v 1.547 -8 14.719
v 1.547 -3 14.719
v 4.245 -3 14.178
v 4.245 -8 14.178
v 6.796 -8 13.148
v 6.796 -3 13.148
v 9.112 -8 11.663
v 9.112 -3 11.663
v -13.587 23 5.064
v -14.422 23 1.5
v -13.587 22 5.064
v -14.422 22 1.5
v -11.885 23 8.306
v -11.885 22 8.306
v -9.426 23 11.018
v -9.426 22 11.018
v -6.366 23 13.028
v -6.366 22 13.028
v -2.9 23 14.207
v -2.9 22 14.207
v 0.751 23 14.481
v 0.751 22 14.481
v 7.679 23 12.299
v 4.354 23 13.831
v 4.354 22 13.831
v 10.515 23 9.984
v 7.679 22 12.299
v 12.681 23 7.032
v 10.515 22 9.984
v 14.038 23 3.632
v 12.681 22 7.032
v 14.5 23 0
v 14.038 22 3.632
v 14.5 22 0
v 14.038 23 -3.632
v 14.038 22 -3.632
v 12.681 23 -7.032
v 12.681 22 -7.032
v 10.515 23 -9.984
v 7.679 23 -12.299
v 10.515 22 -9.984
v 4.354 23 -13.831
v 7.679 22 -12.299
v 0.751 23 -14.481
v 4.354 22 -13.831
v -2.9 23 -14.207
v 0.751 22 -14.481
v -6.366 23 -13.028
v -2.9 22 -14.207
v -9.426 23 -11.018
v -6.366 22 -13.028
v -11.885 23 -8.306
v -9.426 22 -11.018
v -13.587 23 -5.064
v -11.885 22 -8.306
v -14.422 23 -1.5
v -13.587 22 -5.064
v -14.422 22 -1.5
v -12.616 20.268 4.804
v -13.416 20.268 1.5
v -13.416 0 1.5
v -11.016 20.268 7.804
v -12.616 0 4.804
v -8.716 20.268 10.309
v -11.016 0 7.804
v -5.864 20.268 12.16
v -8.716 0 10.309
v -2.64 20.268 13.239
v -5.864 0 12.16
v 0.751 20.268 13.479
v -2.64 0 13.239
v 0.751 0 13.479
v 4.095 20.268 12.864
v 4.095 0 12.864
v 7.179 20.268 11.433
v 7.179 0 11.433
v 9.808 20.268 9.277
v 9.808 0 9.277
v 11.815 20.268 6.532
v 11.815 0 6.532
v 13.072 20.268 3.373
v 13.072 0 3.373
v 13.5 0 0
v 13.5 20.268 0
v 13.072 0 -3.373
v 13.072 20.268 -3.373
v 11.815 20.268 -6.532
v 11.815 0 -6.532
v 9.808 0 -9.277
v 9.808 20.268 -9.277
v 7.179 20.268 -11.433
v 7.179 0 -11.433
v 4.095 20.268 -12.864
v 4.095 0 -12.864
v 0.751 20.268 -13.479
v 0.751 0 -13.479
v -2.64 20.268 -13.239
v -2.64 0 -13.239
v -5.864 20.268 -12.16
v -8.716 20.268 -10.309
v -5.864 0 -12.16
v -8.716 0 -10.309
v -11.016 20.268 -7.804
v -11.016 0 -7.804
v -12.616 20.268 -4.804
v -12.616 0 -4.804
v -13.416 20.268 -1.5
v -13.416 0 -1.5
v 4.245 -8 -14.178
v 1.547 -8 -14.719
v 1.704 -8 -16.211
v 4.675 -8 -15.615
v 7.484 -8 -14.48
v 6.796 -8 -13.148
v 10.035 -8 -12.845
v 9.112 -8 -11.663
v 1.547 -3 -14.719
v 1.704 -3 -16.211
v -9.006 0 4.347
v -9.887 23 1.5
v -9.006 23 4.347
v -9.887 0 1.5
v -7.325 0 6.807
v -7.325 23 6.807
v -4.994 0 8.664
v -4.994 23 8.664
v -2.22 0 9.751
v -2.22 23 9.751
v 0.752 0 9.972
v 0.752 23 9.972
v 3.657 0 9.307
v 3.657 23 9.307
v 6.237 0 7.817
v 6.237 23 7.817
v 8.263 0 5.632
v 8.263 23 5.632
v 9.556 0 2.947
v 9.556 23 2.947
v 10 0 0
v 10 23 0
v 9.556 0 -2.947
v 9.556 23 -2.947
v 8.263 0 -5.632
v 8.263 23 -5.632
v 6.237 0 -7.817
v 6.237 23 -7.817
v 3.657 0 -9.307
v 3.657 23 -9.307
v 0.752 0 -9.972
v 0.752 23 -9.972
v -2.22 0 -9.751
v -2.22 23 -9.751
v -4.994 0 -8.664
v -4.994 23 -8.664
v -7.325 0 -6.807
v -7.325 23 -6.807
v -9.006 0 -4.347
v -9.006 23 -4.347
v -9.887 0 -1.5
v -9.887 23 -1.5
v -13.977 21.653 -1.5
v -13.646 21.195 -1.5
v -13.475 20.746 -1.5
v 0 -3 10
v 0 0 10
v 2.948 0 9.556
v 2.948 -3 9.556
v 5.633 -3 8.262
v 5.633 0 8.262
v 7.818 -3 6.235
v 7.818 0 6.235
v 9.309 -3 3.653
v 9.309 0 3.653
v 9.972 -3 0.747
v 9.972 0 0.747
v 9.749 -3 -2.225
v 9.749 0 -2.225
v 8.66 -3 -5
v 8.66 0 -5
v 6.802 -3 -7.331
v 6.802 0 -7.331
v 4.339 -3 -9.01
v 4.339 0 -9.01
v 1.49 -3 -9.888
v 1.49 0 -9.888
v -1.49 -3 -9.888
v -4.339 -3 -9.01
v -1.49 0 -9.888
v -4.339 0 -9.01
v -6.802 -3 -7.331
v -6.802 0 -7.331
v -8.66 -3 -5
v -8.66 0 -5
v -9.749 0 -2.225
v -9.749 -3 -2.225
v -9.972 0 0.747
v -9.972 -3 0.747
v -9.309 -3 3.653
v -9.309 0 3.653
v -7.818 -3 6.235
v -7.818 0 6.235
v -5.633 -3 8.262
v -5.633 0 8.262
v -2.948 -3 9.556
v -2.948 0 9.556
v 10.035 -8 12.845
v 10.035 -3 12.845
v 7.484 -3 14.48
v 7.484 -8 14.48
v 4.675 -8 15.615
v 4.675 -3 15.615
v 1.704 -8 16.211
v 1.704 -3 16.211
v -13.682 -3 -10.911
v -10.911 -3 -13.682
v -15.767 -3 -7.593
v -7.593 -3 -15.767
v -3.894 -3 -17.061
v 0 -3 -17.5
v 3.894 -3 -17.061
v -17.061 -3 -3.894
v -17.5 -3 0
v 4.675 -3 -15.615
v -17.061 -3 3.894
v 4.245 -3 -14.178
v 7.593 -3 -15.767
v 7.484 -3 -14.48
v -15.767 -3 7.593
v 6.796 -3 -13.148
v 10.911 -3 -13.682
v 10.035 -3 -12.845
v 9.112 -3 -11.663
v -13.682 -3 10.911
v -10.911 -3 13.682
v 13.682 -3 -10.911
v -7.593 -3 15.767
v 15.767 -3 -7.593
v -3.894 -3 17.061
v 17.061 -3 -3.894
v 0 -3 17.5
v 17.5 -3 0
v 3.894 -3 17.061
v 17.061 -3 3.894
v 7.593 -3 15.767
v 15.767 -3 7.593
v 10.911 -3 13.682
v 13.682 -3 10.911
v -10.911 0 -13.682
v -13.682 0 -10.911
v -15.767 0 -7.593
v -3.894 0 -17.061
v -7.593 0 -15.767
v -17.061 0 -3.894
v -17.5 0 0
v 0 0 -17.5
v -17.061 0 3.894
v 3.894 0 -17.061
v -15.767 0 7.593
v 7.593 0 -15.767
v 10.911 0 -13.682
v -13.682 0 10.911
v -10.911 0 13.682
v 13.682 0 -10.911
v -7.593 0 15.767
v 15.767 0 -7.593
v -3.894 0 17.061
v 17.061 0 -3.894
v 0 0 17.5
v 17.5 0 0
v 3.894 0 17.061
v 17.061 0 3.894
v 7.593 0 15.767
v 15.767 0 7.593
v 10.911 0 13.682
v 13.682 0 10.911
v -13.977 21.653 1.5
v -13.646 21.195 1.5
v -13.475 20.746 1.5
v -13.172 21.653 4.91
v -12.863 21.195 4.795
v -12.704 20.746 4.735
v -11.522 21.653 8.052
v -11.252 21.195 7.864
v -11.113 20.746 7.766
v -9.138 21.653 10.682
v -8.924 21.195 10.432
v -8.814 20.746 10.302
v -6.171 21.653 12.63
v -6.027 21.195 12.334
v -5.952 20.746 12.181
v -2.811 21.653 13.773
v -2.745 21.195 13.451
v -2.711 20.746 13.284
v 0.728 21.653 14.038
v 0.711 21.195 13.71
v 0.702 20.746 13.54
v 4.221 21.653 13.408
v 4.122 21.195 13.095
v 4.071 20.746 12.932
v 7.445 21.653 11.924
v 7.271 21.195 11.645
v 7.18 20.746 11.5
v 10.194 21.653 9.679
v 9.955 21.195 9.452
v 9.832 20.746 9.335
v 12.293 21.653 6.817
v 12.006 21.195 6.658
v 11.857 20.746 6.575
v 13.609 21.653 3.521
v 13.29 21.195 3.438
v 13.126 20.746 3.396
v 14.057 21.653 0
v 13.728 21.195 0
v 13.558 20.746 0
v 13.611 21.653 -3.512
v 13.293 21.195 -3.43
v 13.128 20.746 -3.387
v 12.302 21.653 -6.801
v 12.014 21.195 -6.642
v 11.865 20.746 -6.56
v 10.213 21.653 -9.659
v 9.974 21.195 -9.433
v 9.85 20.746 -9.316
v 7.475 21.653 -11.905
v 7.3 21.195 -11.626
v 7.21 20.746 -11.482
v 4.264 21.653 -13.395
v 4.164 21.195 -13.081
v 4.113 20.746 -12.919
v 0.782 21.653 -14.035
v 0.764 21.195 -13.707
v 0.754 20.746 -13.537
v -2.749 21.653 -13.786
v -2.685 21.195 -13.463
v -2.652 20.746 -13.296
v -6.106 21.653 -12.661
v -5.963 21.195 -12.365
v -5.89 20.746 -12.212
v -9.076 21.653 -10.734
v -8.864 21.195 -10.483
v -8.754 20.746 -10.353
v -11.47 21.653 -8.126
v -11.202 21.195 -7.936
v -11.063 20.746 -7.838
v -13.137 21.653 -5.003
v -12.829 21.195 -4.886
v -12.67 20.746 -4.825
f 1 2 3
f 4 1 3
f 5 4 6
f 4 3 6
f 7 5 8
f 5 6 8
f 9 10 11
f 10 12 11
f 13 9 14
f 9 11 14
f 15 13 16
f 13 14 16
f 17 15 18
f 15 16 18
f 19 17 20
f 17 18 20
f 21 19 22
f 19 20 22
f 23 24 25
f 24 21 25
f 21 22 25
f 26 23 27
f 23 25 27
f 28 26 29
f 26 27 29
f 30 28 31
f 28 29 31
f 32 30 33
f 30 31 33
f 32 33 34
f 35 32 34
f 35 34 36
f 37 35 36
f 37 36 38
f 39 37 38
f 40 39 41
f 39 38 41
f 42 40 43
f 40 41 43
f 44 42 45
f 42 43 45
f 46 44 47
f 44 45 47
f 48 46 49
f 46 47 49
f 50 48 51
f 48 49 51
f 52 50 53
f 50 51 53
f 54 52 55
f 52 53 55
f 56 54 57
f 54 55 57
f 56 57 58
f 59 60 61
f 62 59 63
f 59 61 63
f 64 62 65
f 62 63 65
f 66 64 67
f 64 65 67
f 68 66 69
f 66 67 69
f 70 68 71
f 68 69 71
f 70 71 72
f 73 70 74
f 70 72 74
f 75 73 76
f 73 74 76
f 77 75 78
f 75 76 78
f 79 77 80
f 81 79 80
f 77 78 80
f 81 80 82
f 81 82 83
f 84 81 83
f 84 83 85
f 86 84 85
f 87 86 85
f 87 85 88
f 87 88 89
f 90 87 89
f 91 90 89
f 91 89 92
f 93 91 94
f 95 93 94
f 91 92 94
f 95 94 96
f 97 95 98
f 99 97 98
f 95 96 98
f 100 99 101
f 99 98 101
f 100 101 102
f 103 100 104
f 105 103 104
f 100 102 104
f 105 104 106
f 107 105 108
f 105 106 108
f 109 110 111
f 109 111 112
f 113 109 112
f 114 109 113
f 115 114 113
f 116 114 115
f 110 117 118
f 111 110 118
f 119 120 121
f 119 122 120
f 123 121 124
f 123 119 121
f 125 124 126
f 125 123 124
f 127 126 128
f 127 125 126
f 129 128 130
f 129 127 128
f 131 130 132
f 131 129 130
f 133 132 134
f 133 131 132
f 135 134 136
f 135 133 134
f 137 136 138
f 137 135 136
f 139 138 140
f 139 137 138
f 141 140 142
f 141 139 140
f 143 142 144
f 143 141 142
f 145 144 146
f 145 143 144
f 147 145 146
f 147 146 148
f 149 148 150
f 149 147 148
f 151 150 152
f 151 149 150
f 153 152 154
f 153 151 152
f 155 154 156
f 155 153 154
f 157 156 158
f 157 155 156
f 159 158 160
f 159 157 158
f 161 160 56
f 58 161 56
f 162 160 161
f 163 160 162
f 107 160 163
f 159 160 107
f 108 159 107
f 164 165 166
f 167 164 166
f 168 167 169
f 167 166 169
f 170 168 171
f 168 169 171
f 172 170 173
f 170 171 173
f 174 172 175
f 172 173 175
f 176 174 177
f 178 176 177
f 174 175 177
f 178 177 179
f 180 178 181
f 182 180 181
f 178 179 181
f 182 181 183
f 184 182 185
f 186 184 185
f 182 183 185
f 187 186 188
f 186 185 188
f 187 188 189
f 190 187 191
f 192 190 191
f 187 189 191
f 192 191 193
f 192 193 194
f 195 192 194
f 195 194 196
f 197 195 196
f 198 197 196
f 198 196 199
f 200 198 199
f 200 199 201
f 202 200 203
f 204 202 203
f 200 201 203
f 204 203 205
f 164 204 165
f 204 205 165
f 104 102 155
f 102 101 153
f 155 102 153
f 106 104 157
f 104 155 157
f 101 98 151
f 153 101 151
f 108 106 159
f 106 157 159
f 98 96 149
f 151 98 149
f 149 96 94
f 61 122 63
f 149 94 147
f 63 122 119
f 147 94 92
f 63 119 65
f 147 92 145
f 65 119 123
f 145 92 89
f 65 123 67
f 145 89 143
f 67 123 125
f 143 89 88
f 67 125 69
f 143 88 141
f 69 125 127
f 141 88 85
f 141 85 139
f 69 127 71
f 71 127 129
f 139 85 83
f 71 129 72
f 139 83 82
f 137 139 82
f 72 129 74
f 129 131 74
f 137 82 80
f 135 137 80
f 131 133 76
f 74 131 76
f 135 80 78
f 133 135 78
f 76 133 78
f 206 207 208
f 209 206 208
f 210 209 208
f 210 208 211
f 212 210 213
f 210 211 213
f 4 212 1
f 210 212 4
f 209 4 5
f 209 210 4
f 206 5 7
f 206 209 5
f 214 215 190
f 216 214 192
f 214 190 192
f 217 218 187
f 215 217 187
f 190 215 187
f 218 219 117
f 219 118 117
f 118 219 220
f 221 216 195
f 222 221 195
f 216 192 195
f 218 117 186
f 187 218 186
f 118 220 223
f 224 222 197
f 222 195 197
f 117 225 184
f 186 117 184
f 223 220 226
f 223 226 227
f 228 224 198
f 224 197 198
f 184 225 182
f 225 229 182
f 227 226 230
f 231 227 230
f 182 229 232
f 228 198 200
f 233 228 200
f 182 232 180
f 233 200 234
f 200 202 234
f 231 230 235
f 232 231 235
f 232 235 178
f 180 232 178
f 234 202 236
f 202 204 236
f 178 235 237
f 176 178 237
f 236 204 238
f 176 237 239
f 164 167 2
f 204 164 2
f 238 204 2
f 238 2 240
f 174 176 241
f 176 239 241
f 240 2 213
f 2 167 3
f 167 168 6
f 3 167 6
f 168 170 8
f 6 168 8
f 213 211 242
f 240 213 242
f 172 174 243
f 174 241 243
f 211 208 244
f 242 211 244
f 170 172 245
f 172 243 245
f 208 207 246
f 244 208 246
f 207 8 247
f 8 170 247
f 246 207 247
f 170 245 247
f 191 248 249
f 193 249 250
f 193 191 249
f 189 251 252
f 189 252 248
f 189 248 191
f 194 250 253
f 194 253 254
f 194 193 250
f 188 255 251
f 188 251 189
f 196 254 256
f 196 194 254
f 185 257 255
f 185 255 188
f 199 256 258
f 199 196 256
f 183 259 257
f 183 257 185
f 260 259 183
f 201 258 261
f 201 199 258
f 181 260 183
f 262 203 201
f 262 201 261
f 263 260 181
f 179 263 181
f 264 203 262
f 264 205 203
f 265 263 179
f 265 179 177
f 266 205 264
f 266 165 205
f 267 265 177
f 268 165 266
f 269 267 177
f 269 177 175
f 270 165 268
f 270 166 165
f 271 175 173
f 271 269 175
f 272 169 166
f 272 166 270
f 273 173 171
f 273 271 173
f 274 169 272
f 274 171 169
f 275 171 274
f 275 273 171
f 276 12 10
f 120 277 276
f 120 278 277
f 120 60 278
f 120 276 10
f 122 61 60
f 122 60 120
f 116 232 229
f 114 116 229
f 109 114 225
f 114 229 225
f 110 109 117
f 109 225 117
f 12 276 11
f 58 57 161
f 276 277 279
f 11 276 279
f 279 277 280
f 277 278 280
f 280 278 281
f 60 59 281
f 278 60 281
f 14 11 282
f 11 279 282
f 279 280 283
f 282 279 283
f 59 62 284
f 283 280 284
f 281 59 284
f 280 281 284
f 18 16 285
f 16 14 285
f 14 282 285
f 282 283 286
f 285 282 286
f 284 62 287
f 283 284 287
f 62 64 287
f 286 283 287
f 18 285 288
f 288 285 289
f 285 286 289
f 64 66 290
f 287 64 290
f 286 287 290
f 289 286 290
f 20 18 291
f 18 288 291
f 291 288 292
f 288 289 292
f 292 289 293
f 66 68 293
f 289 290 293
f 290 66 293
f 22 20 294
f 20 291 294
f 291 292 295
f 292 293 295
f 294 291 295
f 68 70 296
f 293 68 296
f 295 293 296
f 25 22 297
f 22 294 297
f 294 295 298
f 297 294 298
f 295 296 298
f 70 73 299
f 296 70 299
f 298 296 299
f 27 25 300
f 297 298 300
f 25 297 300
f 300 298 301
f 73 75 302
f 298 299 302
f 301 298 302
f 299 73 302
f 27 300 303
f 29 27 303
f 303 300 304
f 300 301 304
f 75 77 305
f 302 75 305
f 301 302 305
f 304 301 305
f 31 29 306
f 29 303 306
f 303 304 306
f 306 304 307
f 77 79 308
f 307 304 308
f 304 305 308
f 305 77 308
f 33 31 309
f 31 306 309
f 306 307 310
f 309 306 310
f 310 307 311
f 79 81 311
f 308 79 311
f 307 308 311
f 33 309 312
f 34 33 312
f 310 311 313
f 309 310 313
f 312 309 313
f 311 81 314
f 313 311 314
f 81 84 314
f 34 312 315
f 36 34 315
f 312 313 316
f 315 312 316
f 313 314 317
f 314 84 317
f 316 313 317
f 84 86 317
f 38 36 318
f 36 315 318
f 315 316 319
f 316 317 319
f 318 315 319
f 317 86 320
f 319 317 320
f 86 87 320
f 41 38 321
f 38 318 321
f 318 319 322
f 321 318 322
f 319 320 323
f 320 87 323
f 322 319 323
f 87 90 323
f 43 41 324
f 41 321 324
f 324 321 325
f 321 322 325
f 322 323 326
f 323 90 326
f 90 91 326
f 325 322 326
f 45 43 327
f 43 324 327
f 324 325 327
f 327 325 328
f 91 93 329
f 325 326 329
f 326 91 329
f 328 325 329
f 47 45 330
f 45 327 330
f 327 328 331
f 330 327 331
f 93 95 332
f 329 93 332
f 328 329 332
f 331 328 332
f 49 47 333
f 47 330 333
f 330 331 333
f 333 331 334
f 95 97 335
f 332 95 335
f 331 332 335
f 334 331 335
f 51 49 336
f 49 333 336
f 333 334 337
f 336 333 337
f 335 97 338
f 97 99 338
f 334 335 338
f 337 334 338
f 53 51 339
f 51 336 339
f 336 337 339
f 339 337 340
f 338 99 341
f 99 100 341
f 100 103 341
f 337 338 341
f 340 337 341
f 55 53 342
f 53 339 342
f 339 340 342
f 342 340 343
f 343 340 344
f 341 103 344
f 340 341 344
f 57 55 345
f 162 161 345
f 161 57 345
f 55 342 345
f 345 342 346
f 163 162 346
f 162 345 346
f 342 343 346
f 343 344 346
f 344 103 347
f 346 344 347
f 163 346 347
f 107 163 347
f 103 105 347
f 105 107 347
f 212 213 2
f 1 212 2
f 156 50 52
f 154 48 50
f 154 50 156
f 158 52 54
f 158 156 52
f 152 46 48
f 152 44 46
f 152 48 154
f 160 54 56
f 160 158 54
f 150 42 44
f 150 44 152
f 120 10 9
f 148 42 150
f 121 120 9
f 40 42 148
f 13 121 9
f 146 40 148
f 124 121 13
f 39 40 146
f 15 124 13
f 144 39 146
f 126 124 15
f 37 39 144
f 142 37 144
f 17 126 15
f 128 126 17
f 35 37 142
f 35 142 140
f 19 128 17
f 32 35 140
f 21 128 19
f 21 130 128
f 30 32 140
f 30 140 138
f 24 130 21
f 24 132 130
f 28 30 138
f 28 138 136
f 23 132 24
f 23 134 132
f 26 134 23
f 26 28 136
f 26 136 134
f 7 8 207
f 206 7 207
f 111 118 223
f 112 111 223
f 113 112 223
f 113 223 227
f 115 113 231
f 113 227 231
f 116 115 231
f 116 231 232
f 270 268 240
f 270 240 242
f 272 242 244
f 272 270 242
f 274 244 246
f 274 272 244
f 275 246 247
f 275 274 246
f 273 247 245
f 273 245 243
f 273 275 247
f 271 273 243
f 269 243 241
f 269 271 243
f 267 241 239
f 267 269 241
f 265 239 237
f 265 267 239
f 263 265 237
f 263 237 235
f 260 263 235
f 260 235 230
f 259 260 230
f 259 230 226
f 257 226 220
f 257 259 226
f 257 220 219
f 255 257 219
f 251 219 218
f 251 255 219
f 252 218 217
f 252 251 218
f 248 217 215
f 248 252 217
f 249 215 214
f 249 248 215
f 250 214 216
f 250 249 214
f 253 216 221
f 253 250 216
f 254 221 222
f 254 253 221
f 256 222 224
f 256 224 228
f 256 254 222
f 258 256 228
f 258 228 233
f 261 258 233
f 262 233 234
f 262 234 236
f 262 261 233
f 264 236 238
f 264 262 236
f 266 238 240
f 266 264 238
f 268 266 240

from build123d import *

# Parameters (mm, degrees)
SKETCH2_R           = 13.5
SKETCH2_R_2         = 10
BOSS_EXTRUDE1_DEPTH = 22
SKETCH2_4_R         = 17.5
SKETCH2_4_R_2       = 13.5
SKETCH2_4_R_3       = 10
BOSS_EXTRUDE2_DEPTH = 3
BOSS_EXTRUDE3_DEPTH = 5
SKETCH4_R           = 14.5
SKETCH4_R_2         = 10
BOSS_EXTRUDE4_DEPTH = 1
FILLET1_R           = 2
CUT_EXTRUDE1_START  = -31
CUT_EXTRUDE1_DEPTH  = 31


with BuildPart() as part:
    # Sketch2 → Boss-Extrude1 (new body)
    with BuildSketch(Plane(origin=(0, 0, 0), x_dir=(1, 0, 0), z_dir=(0, 1, 0))):
        with Locations(Location((0, 0, 0), (0, 0, 270))):
            Circle(SKETCH2_R)
        with Locations(Location((0, 0, 0), (0, 0, 270))):
            Circle(SKETCH2_R_2, mode=Mode.SUBTRACT)
    extrude(amount=BOSS_EXTRUDE1_DEPTH)

    # Sketch4 → Boss-Extrude4 (add)
    with BuildSketch(Plane(origin=(0, 22, 0), x_dir=(1, 0, 0), z_dir=(0, 1, 0))):
        with Locations(Location((0, 0, 0), (0, 0, 270))):
            Circle(SKETCH4_R)
        with Locations(Location((0, 0, 0), (0, 0, 270))):
            Circle(SKETCH4_R_2, mode=Mode.SUBTRACT)
    extrude(amount=BOSS_EXTRUDE4_DEPTH)

    # Fillet1
    # the kernel refuses this fillet: 2 mm, written as the material it adds along each edge
    with BuildSketch(Plane(origin=(0, 22, 0), x_dir=(0, 0, 1), z_dir=(-1, 0, 0))) as fillet1_piece_1:
        with BuildLine():
            CenterArc((15.5, -1.732050808), FILLET1_R, 120, 60)
            Line((14.5, 0), (14.48, 0.034641016))
            ThreePointArc((14.48, 0.034641016), (14, 0.04), (13.5, 0.04))
            Line((13.5, 0.04), (13.46, 0))
            Line((13.46, 0), (13.46, -1.732050808))
            Line((13.46, -1.732050808), (13.5, -1.732050808))
        make_face()
    revolve(axis=Axis((0, 22, 0), (0, 1, 0)))

    # Sketch5 → Cut-Extrude1 (cut)
    with BuildSketch(Plane(origin=(0, 23, 0), x_dir=(1, 0, 0), z_dir=(0, 1, 0)).offset(CUT_EXTRUDE1_START)):
        with BuildLine():
            Line((-9.886859967, 1.5), (-14.422205102, 1.5))
            ThreePointArc((-14.422205102, 1.5), (-14.5, 0), (-14.422205102, -1.5))
            Line((-14.422205102, -1.5), (-9.886859967, -1.5))
            ThreePointArc((-9.886859967, -1.5), (-10, 0), (-9.886859967, 1.5))
        make_face()
    extrude(amount=CUT_EXTRUDE1_DEPTH, mode=Mode.SUBTRACT)


with BuildPart() as body_2:
    # Sketch2<4> → Boss-Extrude2 (new body)
    # profile 1 of 2: a face of its own
    with BuildSketch(Plane(origin=(0, 0, 0), x_dir=(1, 0, 0), z_dir=(0, 1, 0))):
        with Locations(Location((0, 0, 0), (0, 0, 270))):
            Circle(SKETCH2_4_R)
        with Locations(Location((0, 0, 0), (0, 0, 270))):
            Circle(SKETCH2_4_R_2, mode=Mode.SUBTRACT)
    # profile 2 of 2: a face of its own
    with BuildSketch(Plane(origin=(0, 0, 0), x_dir=(1, 0, 0), z_dir=(0, 1, 0))):
        with Locations(Location((0, 0, 0), (0, 0, 270))):
            Circle(SKETCH2_4_R_2)
        with Locations(Location((0, 0, 0), (0, 0, 270))):
            Circle(SKETCH2_4_R_3, mode=Mode.SUBTRACT)
    extrude(amount=-BOSS_EXTRUDE2_DEPTH)

    # Sketch3 → Boss-Extrude3 (add)
    with BuildSketch(Plane.XZ.offset(3)):
        with BuildLine():
            Line((9.111789835, 11.662559153), (10.035282048, 12.844575284))
            ThreePointArc((10.035282048, 12.844575284), (6.106087473, 15.113096829), (1.703813951, 16.210706895))
            Line((1.703813951, 16.210706895), (1.547021256, 14.718924051))
            ThreePointArc((1.547021256, 14.718924051), (5.544177583, 13.722321048), (9.111789835, 11.662559153))
        make_face()
        with BuildLine():
            Line((1.547021256, -14.718924051), (1.703813951, -16.210706895))
            ThreePointArc((1.703813951, -16.210706895), (6.106087473, -15.113096829), (10.035282048, -12.844575284))
            Line((10.035282048, -12.844575284), (9.111789835, -11.662559153))
            ThreePointArc((9.111789835, -11.662559153), (5.544177583, -13.722321048), (1.547021256, -14.718924051))
        make_face()
    extrude(amount=BOSS_EXTRUDE3_DEPTH)


solid = Compound([part.part, body_2.part])
